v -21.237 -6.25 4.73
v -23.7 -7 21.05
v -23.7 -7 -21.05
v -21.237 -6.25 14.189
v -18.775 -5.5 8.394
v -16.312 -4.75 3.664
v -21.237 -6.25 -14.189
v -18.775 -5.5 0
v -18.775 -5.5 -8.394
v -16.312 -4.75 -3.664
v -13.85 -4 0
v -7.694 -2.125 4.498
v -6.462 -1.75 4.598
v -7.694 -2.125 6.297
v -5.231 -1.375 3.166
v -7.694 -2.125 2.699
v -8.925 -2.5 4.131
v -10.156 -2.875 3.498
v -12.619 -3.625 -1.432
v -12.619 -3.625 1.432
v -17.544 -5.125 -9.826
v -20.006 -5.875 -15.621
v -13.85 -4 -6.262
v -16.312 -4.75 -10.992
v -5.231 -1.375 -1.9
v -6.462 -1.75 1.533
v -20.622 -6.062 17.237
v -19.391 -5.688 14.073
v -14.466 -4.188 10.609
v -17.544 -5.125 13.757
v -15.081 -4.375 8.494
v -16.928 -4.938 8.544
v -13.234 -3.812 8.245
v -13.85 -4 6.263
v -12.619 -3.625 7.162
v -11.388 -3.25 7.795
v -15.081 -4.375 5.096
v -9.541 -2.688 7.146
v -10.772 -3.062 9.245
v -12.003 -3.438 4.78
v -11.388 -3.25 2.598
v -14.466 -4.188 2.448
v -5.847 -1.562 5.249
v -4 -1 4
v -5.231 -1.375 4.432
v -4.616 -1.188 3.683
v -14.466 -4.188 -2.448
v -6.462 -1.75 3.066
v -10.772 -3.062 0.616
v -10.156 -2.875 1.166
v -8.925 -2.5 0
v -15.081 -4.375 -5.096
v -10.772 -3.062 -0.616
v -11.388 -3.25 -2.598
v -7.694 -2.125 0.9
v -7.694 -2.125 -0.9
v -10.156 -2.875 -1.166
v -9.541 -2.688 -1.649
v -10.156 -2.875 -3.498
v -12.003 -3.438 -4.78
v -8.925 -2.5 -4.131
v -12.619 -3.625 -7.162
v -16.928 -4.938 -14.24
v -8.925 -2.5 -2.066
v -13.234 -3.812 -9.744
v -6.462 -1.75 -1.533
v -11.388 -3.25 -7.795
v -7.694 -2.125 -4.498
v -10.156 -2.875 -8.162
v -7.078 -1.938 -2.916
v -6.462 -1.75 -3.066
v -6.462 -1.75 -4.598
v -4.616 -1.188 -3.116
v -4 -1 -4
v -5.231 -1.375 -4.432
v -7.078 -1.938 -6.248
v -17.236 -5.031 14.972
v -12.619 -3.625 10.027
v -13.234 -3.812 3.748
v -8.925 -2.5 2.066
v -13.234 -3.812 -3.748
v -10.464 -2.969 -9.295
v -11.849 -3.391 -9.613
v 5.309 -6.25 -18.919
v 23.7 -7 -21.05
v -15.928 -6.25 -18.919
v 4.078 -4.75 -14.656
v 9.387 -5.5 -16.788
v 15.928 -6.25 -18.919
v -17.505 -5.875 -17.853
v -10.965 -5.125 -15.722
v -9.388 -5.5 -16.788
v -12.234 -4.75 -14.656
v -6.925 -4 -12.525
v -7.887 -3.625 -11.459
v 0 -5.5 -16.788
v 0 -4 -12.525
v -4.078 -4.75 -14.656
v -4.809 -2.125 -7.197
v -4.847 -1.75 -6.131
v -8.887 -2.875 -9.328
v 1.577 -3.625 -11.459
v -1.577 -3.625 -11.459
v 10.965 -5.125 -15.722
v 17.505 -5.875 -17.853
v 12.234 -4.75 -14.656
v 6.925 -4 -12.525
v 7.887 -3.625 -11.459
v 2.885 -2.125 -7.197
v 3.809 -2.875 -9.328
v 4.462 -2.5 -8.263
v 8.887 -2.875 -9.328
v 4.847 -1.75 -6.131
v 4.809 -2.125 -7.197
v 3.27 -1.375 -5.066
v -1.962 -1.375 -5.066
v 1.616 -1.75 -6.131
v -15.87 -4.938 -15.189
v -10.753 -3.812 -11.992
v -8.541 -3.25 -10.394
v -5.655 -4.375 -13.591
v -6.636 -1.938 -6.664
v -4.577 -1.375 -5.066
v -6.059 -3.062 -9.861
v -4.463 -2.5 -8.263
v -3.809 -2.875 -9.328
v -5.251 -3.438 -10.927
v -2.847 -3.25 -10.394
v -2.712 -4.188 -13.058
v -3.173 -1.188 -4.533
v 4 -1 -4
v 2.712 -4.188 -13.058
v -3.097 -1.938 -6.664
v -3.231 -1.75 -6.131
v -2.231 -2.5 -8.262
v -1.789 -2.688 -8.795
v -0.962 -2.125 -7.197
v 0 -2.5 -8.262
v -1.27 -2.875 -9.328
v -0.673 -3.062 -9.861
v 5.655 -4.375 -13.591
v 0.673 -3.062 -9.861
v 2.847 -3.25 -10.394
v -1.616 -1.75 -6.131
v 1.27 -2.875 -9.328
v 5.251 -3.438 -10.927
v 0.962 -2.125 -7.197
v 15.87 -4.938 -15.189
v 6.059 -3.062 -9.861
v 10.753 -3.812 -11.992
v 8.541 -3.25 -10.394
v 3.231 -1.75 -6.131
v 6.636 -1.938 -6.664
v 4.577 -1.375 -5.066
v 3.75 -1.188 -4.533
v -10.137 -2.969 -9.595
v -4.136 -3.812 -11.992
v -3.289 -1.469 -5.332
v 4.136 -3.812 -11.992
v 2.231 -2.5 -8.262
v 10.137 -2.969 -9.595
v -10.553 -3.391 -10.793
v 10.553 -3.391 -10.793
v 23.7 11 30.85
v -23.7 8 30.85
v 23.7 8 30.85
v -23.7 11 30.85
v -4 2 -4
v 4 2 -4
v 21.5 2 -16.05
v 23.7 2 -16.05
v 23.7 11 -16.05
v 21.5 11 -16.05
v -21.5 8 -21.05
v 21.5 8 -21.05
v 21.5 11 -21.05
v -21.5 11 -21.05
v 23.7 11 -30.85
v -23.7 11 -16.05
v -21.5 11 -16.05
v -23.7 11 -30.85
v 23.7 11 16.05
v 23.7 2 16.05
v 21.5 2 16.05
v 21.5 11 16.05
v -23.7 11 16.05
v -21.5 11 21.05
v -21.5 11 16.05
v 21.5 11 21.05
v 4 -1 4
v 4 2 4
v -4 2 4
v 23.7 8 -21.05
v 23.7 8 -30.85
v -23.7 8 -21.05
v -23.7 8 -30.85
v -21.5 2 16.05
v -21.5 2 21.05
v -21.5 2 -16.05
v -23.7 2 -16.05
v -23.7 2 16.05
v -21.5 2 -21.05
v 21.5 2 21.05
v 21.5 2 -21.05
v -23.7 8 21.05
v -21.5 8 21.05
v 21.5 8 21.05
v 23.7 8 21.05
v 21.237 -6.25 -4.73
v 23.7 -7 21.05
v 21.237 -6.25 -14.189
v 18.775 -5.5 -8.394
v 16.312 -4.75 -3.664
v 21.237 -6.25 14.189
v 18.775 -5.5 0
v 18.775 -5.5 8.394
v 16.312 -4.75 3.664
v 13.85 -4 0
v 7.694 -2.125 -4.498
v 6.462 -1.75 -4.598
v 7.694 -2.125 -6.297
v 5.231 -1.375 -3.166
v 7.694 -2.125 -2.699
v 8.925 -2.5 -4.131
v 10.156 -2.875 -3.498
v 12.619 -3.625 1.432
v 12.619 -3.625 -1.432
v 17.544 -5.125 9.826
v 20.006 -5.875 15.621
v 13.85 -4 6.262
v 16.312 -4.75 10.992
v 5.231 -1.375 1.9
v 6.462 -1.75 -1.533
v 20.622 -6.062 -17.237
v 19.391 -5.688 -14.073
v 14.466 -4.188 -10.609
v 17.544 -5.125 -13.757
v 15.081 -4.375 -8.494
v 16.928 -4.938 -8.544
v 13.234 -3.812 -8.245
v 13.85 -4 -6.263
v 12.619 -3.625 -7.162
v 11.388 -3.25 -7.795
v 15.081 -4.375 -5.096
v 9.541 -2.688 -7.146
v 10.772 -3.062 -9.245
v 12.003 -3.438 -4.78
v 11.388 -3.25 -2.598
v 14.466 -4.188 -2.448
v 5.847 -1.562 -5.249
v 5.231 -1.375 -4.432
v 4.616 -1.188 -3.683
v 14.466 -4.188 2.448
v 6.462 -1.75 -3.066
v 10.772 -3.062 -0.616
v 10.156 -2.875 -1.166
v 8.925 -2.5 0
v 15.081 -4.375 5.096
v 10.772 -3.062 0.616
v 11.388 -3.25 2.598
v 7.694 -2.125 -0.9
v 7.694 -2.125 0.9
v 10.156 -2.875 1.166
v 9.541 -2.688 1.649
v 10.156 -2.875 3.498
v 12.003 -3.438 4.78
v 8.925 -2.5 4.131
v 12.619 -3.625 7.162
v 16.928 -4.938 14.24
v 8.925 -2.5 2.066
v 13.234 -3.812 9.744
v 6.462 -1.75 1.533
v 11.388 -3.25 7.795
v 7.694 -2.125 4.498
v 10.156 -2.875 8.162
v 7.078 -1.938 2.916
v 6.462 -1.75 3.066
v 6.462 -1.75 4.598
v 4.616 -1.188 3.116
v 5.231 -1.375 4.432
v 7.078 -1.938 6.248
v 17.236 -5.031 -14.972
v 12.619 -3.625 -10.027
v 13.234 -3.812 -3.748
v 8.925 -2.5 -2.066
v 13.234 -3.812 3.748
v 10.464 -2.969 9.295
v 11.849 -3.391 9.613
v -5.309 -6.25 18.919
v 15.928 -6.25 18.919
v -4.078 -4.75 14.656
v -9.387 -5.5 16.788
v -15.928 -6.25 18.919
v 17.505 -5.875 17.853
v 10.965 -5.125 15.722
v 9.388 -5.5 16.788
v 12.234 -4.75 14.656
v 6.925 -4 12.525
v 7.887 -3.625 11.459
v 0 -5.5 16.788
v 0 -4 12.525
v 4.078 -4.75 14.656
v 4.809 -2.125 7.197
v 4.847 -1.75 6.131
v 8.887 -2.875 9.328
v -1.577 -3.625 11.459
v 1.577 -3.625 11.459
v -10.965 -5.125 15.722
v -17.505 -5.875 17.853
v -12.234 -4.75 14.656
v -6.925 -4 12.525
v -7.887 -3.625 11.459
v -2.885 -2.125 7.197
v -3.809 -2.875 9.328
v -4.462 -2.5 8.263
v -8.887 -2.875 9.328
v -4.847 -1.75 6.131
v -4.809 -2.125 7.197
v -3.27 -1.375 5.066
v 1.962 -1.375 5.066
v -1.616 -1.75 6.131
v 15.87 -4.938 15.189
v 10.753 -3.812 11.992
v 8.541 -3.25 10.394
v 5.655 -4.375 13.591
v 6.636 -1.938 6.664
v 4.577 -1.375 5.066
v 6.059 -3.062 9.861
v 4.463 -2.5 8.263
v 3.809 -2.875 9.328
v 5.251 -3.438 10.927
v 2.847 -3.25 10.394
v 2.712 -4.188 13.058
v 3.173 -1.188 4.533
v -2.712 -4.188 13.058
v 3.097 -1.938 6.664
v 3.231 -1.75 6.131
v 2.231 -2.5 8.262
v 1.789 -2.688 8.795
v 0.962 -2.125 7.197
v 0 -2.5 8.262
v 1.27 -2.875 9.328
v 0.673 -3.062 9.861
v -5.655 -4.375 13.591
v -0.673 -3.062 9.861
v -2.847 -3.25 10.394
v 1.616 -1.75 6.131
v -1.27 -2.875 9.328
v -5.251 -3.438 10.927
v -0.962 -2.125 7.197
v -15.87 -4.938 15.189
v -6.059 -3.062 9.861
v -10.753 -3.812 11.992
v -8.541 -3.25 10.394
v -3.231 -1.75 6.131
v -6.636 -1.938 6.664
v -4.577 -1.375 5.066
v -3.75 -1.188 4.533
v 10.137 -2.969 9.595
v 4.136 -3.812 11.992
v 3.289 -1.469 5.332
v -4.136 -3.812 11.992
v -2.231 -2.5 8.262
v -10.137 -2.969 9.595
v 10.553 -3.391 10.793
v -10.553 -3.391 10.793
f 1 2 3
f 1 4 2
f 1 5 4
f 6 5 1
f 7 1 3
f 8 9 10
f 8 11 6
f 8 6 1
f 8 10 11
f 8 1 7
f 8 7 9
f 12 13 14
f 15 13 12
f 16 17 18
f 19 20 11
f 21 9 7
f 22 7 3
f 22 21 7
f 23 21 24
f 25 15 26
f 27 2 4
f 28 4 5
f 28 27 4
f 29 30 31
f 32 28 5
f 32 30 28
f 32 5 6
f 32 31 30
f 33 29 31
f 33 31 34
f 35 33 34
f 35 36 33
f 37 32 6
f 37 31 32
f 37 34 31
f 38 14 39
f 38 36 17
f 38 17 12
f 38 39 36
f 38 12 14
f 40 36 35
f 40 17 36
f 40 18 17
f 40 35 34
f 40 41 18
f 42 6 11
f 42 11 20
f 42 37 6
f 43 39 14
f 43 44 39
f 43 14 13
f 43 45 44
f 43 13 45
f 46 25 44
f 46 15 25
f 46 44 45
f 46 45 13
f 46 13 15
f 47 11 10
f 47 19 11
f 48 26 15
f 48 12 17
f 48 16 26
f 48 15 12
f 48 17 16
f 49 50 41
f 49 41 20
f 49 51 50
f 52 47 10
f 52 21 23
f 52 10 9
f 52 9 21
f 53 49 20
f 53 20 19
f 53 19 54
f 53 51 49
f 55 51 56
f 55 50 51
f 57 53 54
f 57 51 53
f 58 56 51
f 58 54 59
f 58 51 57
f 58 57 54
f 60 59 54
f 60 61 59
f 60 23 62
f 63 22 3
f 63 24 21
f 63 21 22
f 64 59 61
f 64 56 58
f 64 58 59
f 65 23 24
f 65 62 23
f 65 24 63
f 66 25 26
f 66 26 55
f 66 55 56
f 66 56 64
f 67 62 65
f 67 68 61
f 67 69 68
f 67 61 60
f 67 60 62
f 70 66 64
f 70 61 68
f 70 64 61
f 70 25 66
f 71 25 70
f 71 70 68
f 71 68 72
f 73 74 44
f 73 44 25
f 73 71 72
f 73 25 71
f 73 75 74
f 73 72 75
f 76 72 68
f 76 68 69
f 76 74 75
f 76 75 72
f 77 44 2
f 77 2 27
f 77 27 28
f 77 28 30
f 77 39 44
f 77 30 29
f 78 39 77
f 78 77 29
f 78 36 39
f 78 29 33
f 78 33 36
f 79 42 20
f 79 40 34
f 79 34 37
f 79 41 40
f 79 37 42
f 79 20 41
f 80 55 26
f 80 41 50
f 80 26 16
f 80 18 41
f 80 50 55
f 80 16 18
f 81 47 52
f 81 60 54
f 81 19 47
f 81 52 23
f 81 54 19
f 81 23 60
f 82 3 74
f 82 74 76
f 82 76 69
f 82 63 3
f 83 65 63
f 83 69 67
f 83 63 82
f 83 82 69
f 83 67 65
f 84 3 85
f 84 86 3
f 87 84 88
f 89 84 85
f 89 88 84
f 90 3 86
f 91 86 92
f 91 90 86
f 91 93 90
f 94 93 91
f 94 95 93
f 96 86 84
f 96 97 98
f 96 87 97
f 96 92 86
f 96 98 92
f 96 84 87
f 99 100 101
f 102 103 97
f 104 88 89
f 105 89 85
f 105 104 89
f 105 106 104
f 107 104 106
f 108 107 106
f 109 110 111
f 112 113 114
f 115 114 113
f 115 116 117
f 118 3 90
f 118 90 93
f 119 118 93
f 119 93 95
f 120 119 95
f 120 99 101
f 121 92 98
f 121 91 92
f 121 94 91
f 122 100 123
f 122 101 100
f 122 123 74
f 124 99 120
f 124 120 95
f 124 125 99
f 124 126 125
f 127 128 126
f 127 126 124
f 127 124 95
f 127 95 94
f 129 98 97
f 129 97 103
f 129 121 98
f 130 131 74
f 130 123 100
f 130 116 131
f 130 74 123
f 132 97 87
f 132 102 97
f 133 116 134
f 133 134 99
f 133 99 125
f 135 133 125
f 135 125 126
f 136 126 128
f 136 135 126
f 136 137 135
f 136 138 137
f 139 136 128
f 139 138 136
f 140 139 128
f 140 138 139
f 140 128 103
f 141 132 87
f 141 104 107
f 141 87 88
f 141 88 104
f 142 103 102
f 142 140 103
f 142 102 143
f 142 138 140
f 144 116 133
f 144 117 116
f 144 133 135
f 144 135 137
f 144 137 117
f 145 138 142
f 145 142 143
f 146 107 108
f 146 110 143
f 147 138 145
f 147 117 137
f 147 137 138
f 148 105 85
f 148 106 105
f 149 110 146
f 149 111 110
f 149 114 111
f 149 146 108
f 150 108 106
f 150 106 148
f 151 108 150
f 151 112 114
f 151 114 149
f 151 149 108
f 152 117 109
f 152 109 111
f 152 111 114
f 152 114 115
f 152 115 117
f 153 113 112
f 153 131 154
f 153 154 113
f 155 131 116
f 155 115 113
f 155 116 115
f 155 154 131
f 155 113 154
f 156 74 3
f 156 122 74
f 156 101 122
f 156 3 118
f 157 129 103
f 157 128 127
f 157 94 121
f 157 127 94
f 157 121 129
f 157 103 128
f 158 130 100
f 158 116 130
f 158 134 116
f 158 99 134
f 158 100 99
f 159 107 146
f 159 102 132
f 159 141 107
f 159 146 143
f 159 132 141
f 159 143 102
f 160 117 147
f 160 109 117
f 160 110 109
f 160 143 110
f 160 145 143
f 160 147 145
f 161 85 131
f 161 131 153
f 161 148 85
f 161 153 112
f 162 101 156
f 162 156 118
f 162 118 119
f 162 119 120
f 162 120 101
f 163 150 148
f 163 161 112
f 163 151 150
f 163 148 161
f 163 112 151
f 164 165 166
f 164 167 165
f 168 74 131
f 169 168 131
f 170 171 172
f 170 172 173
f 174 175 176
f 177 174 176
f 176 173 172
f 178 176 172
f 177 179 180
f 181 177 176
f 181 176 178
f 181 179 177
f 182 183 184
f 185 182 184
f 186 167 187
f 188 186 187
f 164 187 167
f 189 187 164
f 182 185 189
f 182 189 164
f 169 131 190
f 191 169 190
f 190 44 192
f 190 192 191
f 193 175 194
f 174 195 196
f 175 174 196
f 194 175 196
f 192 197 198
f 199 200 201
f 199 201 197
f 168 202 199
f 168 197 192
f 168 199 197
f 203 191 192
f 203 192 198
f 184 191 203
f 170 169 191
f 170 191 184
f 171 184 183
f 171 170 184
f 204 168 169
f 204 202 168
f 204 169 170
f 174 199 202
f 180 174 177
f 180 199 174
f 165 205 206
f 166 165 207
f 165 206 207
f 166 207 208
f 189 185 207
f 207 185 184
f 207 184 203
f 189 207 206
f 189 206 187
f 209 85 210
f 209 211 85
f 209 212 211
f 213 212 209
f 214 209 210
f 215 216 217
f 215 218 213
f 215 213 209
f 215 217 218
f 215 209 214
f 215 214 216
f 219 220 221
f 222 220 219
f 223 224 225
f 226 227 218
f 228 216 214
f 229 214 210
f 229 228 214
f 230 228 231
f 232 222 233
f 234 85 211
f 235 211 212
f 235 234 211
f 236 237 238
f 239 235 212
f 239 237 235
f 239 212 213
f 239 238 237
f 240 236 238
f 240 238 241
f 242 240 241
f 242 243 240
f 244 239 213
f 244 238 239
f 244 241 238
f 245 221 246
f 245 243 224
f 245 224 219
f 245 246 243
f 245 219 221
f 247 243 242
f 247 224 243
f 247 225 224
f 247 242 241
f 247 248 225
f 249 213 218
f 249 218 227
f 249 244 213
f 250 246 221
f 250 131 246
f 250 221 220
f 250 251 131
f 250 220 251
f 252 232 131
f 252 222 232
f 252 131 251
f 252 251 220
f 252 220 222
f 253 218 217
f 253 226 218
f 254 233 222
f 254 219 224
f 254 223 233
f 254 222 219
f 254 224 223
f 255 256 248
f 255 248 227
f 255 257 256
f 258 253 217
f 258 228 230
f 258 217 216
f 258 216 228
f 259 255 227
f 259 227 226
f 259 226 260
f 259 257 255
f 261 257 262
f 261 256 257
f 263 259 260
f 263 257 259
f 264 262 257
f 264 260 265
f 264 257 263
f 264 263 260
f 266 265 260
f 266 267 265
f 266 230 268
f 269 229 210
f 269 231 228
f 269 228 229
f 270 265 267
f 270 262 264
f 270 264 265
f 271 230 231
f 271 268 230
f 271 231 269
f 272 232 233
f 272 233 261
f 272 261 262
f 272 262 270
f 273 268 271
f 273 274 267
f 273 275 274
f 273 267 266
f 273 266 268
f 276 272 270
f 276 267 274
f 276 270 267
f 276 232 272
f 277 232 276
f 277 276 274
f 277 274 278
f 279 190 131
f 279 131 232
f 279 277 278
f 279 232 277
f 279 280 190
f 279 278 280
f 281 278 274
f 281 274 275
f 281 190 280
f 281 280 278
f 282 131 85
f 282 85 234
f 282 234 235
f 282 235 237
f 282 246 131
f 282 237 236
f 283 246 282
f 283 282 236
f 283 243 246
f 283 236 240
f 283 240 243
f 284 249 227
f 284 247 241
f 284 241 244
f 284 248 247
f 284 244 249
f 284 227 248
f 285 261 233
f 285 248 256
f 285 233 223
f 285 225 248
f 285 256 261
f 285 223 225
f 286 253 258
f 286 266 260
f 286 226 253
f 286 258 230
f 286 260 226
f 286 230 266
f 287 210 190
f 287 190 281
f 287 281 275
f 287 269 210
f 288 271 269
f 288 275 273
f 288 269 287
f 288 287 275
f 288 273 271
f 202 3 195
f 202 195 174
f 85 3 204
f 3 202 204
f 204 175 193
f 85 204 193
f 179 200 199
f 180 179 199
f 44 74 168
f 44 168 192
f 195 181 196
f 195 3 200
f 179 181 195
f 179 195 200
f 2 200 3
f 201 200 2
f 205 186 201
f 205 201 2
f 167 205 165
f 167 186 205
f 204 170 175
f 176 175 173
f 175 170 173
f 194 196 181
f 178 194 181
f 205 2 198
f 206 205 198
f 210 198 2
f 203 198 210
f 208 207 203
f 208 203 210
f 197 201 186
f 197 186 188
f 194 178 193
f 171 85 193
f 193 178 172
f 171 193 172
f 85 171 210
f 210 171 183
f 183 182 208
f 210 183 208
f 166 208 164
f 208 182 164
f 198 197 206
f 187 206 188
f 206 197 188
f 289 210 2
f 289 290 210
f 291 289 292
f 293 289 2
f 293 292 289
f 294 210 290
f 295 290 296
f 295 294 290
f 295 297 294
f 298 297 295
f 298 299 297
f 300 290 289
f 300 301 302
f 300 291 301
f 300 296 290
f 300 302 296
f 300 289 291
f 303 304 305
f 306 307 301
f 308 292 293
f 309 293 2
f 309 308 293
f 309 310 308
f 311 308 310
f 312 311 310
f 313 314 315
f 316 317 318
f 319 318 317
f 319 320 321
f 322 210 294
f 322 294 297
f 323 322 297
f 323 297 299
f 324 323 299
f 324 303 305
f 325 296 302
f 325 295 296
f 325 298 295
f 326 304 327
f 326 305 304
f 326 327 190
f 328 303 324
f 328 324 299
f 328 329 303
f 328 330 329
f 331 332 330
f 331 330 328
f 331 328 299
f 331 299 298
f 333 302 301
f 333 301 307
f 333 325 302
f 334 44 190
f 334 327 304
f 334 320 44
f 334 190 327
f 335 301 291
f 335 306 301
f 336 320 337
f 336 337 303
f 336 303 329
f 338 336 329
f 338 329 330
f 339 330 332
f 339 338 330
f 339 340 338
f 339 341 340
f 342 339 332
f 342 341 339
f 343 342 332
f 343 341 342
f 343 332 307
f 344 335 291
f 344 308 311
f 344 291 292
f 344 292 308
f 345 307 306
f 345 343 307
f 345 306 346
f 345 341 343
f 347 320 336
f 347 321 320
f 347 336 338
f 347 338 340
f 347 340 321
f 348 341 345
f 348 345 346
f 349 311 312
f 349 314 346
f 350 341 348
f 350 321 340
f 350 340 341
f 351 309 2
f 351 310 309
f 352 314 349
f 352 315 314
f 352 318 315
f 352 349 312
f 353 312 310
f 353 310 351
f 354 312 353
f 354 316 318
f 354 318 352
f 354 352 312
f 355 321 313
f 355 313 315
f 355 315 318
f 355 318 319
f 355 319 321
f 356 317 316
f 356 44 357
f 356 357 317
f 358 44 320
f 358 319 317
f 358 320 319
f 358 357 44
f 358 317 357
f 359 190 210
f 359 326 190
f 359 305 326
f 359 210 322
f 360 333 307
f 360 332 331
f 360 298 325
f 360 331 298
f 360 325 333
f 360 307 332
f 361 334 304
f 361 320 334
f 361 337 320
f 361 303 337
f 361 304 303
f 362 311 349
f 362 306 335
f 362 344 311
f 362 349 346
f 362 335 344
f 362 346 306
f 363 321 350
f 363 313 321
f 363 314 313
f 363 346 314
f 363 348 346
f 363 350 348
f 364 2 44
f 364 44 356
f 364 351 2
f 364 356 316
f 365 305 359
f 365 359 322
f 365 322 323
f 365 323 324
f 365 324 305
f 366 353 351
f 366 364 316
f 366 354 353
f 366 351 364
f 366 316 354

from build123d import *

# Parameters (mm, degrees)
BOSS_EXTRUDE1_DEPTH      = 2
BOSS_EXTRUDE1_DEPTH_BACK = 1
SKETCH3_W                = 47.4
SKETCH3_H                = 42.1
SKETCH4_W                = 2.2
SKETCH4_H                = 5
BOSS_EXTRUDE2_DEPTH      = 9
SKETCH6_W                = 2.2
SKETCH6_H                = 3
BOSS_EXTRUDE3_DEPTH      = 9.8
BOSS_EXTRUDE5_REACH      = 57.819
SKETCH10_W               = 9.8
SKETCH10_H               = 3
MIRROR3_COPY_1_SKETCH_W  = 2.2
MIRROR3_COPY_1_SKETCH_H  = 5
MIRROR3_COPY_1_DEPTH     = 9
MIRROR3_COPY_2_SKETCH_W  = 2.2
MIRROR3_COPY_2_SKETCH_H  = 3
MIRROR3_COPY_2_DEPTH     = 9.8
SKETCH7_W                = 8
SKETCH7_H                = 8
CUT_EXTRUDE1_DEPTH       = 3
SKETCH12_W               = 47.4
SKETCH12_H               = 42.1
BOSS_EXTRUDE6_DEPTH      = 6


with BuildPart() as part:
    # Sketch3 → Boss-Extrude1 (new, two sides: drawn at the far end of the back side and taken through both)
    with BuildSketch(Plane(origin=(0, 0, 0), x_dir=(1, 0, 0), z_dir=(0, 1, 0)).offset(-BOSS_EXTRUDE1_DEPTH_BACK)):
        Rectangle(SKETCH3_W, SKETCH3_H)
    extrude(amount=BOSS_EXTRUDE1_DEPTH + BOSS_EXTRUDE1_DEPTH_BACK)

    # Sketch4 → Boss-Extrude2 (add)
    with BuildSketch(Plane(origin=(0, 2, 0), x_dir=(1, 0, 0), z_dir=(0, 1, 0))):
        with Locations((-22.6, 18.55)):
            Rectangle(SKETCH4_W, SKETCH4_H)
    boss_extrude2 = extrude(amount=BOSS_EXTRUDE2_DEPTH)

    # Sketch6 → Boss-Extrude3 (add)
    with BuildSketch(Plane(origin=(0, 0, -21.05), x_dir=(-1, 0, 0), z_dir=(0, 0, -1))):
        with Locations((22.6, 9.5)):
            Rectangle(SKETCH6_W, SKETCH6_H)
    boss_extrude3 = extrude(amount=BOSS_EXTRUDE3_DEPTH)

    # Mirror1: Boss-Extrude2, Boss-Extrude3 across plane
    add(boss_extrude2.mirror(Plane(origin=(0, 0, 0), x_dir=(0, 0, 1), z_dir=(1, 0, 0))))
    add(boss_extrude3.mirror(Plane(origin=(0, 0, 0), x_dir=(0, 0, 1), z_dir=(1, 0, 0))))

    # Sketch10 → Boss-Extrude5 (add, up to next)
    with BuildSketch(Plane(origin=(-21.5, 0, 0), x_dir=(0, 0, -1), z_dir=(1, 0, 0)), mode=Mode.PRIVATE) as boss_extrude5_sk1:
        with Locations((25.95, 9.5)):
            Rectangle(SKETCH10_W, SKETCH10_H)
    boss_extrude5_tool1 = extrude(boss_extrude5_sk1.sketch, amount=BOSS_EXTRUDE5_REACH, mode=Mode.PRIVATE) - part.part
    boss_extrude5 = boss_extrude5_tool1.solids().sort_by_distance((-21.5, 9.5, -25.95))[0]
    add(boss_extrude5)

    # Mirror3: Boss-Extrude2, Boss-Extrude3, Boss-Extrude5 across plane
    add(boss_extrude2.mirror(Plane.XY))
    add(boss_extrude3.mirror(Plane.XY))
    add(boss_extrude5.mirror(Plane.XY))

    # Mirror3 copy 1 sketch → Mirror3 copy 1 (add)
    with BuildSketch(Plane(origin=(0, 2, 0), x_dir=(-1, 0, 0), z_dir=(0, 1, 0))):
        with Locations((-22.6, 18.55)):
            Rectangle(MIRROR3_COPY_1_SKETCH_W, MIRROR3_COPY_1_SKETCH_H)
    extrude(amount=MIRROR3_COPY_1_DEPTH)

    # Mirror3 copy 2 sketch → Mirror3 copy 2 (add)
    with BuildSketch(Plane.XY.offset(21.05)):
        with Locations((22.6, 9.5)):
            Rectangle(MIRROR3_COPY_2_SKETCH_W, MIRROR3_COPY_2_SKETCH_H)
    extrude(amount=MIRROR3_COPY_2_DEPTH)

    # Sketch7 → Cut-Extrude1 (cut)
    with BuildSketch(Plane.XZ.offset(1)):
        Rectangle(SKETCH7_W, SKETCH7_H)
    extrude(amount=-CUT_EXTRUDE1_DEPTH, mode=Mode.SUBTRACT)

    # Sketch12 → Boss-Extrude6 (add)
    with BuildSketch(Plane.XZ.offset(1)):
        Rectangle(SKETCH12_W, SKETCH12_H)
    extrude(amount=BOSS_EXTRUDE6_DEPTH)

    # loft from a face of the part (cut_loft1)
    loft([part.faces().sort_by_distance((0, -7, 0))[0], part.faces().sort_by_distance((0, -1, 0))[0]], mode=Mode.SUBTRACT)


solid = part.part
